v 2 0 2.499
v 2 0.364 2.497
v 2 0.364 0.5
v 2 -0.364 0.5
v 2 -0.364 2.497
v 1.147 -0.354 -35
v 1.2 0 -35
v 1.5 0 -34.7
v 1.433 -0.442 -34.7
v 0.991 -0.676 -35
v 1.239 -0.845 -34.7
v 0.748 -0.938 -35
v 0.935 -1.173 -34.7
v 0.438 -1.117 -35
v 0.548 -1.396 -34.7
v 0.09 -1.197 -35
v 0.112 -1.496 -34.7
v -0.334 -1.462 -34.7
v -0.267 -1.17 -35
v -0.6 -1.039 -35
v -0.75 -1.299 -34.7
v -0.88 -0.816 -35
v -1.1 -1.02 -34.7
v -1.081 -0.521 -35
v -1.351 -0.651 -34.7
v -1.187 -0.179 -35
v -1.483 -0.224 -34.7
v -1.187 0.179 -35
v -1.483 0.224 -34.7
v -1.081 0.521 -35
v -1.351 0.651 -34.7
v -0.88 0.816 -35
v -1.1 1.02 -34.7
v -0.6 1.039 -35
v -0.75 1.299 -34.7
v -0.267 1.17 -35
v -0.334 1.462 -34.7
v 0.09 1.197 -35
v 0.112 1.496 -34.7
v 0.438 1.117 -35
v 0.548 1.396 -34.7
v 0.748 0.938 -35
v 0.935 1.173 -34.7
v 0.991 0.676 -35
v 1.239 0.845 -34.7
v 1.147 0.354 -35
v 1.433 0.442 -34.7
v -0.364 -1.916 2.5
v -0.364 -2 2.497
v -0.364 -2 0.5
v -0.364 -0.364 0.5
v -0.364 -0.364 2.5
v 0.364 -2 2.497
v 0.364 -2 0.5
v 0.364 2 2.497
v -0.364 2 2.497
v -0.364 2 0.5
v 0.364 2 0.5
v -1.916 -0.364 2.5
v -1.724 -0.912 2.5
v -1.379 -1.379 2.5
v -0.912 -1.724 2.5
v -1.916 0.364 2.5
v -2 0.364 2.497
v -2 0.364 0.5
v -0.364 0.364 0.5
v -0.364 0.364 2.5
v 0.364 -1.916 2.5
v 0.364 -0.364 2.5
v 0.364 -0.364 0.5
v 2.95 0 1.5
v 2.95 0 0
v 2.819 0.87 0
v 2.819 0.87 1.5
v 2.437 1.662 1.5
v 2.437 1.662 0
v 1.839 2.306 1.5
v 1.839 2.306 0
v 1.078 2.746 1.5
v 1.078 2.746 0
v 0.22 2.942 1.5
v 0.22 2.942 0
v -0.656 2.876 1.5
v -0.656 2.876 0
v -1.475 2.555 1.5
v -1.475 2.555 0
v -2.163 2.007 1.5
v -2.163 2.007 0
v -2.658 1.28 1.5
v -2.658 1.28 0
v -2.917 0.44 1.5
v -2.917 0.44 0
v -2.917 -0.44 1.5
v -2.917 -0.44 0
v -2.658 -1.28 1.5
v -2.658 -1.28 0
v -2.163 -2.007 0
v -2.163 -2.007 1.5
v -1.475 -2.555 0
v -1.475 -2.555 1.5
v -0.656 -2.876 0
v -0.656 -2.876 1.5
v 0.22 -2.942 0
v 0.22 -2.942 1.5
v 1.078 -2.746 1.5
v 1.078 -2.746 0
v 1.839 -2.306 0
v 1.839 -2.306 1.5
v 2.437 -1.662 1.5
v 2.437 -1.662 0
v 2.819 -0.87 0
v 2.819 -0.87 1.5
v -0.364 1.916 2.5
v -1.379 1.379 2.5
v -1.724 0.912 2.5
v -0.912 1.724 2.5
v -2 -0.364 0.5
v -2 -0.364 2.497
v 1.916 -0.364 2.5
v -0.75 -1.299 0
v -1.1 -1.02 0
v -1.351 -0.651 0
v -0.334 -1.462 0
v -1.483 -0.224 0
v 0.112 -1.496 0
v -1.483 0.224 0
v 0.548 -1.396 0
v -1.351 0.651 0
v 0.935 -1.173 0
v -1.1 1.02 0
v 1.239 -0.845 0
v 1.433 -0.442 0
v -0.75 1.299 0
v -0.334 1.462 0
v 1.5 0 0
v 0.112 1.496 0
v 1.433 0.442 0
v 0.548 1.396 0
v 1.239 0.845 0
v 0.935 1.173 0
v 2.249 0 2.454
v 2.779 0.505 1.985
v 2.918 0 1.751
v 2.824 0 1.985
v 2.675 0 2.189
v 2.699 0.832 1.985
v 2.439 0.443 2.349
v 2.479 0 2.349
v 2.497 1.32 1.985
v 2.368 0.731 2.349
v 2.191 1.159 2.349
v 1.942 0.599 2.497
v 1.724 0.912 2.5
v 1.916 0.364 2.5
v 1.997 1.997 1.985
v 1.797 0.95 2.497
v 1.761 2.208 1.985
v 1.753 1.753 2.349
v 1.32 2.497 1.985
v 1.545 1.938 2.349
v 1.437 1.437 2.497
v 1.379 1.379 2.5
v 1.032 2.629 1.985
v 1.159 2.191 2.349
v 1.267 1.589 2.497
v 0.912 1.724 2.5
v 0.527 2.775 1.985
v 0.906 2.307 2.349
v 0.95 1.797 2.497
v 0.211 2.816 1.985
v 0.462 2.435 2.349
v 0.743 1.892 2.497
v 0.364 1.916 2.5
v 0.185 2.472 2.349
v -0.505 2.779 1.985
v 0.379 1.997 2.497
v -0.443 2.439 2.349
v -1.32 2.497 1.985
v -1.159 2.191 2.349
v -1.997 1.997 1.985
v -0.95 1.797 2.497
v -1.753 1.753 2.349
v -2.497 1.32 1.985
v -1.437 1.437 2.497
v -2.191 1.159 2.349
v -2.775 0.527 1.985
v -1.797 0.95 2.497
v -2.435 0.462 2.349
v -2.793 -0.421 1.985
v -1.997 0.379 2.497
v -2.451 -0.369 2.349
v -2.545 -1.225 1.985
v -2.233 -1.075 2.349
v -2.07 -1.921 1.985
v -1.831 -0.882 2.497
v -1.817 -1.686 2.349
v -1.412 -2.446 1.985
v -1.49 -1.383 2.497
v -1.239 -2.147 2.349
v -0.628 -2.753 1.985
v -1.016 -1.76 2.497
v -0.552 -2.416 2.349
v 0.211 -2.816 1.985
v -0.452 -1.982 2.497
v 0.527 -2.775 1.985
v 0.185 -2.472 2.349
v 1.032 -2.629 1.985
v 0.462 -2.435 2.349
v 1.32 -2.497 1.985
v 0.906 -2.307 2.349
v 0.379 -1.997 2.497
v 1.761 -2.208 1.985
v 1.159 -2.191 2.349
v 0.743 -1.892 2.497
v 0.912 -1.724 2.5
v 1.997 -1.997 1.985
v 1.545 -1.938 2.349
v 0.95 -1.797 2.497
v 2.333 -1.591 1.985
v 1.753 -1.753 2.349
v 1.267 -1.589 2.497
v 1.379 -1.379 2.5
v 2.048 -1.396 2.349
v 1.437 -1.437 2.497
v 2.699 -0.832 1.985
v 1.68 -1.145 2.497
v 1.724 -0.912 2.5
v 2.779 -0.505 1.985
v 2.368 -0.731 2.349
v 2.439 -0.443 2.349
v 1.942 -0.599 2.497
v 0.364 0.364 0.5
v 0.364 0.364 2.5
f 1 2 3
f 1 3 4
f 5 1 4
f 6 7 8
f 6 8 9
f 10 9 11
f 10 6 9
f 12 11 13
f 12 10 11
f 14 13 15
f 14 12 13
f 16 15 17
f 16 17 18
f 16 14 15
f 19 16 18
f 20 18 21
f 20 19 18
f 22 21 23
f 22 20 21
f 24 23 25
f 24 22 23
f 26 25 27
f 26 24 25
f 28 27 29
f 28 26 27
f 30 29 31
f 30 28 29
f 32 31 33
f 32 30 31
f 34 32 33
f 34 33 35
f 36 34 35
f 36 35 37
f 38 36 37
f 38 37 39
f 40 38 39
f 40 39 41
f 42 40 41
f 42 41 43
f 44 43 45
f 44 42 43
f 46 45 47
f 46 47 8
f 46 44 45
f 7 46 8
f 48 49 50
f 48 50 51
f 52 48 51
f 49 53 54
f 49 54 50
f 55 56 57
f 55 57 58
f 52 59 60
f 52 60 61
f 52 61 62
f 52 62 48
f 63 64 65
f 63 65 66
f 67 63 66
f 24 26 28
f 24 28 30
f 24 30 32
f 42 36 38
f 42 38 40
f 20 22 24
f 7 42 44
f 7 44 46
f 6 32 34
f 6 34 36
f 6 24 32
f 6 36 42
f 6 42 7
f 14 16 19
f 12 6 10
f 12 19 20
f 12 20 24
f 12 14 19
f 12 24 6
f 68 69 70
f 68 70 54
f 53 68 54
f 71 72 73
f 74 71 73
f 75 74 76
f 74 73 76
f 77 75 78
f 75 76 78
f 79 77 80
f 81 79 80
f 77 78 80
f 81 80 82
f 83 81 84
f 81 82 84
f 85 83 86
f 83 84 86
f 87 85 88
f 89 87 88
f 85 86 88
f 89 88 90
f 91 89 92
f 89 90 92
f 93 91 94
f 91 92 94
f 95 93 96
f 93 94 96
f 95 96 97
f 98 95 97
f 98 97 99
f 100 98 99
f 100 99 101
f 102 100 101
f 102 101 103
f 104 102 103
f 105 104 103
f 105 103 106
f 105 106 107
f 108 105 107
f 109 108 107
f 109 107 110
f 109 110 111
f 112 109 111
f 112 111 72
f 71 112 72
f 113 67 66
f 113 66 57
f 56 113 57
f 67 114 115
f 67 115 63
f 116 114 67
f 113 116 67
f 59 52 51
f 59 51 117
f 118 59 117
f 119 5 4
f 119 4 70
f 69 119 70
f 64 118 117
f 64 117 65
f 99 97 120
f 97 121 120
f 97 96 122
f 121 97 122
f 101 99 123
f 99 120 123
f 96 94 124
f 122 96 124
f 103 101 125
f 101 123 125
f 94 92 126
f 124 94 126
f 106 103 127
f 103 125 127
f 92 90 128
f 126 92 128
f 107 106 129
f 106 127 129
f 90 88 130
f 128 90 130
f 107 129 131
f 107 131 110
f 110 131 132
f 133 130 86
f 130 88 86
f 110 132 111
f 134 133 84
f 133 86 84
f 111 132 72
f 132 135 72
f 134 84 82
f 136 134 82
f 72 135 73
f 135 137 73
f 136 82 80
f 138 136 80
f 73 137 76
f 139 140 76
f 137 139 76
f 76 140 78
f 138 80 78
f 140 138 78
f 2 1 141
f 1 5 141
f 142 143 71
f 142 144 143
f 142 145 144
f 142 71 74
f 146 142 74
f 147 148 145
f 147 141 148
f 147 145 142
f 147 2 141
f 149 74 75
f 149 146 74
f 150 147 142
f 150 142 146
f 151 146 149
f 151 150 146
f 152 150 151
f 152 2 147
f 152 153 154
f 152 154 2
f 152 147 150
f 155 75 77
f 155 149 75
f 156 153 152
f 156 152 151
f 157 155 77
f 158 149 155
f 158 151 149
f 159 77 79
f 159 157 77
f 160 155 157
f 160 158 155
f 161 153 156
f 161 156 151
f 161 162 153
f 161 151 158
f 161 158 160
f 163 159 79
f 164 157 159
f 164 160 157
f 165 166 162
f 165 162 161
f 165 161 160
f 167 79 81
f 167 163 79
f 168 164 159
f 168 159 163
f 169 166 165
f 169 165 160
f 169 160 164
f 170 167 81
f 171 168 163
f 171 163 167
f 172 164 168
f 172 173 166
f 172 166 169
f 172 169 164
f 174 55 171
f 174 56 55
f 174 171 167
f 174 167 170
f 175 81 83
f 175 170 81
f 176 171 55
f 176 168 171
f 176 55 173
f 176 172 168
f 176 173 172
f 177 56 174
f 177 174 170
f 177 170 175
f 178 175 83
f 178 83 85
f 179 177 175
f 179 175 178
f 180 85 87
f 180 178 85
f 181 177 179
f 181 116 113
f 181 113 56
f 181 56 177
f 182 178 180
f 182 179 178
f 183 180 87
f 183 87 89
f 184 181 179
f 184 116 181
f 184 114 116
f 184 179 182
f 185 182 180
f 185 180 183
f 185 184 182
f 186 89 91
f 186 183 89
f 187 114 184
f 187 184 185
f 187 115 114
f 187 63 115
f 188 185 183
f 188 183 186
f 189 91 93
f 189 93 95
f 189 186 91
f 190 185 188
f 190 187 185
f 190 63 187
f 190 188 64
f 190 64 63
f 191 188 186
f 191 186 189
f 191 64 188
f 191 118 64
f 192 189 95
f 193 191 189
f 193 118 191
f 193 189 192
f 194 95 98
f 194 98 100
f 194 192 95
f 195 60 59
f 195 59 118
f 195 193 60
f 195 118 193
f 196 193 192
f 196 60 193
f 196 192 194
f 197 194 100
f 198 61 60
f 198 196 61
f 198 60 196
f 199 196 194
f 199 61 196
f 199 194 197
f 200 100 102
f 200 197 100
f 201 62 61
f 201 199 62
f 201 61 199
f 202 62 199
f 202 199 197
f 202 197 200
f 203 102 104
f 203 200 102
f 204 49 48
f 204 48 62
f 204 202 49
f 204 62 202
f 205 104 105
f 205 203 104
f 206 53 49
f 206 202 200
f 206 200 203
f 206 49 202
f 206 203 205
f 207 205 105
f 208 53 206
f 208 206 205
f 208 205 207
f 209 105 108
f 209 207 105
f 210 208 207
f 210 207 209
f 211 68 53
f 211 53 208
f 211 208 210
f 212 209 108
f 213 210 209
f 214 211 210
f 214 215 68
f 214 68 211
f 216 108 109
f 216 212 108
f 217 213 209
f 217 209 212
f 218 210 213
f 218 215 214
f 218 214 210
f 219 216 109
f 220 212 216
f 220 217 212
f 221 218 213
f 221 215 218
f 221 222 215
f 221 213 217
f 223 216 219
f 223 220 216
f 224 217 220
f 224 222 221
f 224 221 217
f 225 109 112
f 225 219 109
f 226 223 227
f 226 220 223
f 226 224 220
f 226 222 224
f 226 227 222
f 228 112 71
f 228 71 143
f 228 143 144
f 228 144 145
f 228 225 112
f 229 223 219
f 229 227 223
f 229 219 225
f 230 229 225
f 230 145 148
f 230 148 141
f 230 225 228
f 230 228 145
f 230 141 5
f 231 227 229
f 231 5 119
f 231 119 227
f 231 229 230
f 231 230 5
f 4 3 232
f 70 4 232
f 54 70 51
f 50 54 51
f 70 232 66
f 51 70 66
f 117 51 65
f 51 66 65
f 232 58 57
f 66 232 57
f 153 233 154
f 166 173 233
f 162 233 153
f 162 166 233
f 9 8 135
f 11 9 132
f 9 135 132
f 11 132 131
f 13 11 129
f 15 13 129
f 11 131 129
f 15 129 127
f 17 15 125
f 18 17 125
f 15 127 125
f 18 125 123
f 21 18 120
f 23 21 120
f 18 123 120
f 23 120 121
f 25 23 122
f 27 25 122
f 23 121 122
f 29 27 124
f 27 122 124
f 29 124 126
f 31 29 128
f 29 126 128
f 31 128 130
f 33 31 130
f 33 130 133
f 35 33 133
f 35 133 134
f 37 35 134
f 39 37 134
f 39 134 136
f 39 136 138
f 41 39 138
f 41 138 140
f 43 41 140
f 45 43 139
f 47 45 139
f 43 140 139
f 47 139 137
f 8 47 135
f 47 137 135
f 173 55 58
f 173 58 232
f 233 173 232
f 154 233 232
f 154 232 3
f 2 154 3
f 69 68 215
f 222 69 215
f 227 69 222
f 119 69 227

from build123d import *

# Parameters (mm, degrees)
SKETCH1_R           = 2.95
BOSS_EXTRUDE1_DEPTH = 2.5
SKETCH2_R           = 1.5
BOSS_EXTRUDE2_DEPTH = 35
CHAMFER1_SIZE       = 0.3
CUT_EXTRUDE1_DEPTH  = 2
FILLET1_R           = 1


with BuildPart() as part:
    # Sketch1 → Boss-Extrude1 (new body)
    with BuildSketch(Plane.XY):
        Circle(SKETCH1_R)
    extrude(amount=BOSS_EXTRUDE1_DEPTH)

    # Sketch2 → Boss-Extrude2 (add)
    with BuildSketch(Plane(origin=(0, 0, 0), x_dir=(-1, 0, 0), z_dir=(0, 0, -1))):
        with Locations(Location((0, 0, 0), (0, 0, 180))):
            Circle(SKETCH2_R)
    extrude(amount=BOSS_EXTRUDE2_DEPTH)

    # Chamfer1
    chamfer1_edges = [part.edges().sort_by_distance(p)[0] for p in [
        (-1.5, 0, -35),
    ]]
    chamfer(chamfer1_edges, length=CHAMFER1_SIZE)

    # Sketch3 → Cut-Extrude1 (cut)
    with BuildSketch(Plane.XY.offset(2.5)):
        Polygon((0.363589324, 0.363589324), (2, 0.363589324), (2, -0.363589324), (0.363589324, -0.363589324), (0.363589324, -2), (-0.363589324, -2), (-0.363589324, -0.363589324), (-2, -0.363589324), (-2, 0.363589324), (-0.363589324, 0.363589324), (-0.363589324, 2), (0.363589324, 2), align=None)
    extrude(amount=-CUT_EXTRUDE1_DEPTH, mode=Mode.SUBTRACT)

    # Fillet1
    # the kernel refuses this fillet: 1 mm, written as the material it takes off along each edge
    with BuildSketch(Plane(origin=(0, 0, 2.5), x_dir=(1, 0, 0), z_dir=(0, -1, 0))) as fillet1_piece_1:
        with BuildLine():
            CenterArc((2.95 - FILLET1_R, -FILLET1_R), FILLET1_R, 0, 90)
            Line((2.95 - FILLET1_R, 0), (2.95, 0))
            Line((2.95, 0), (2.95, -FILLET1_R))
        make_face()
    revolve(axis=Axis((0, 0, 2.5), (0, 0, 1)), mode=Mode.SUBTRACT)


solid = part.part
